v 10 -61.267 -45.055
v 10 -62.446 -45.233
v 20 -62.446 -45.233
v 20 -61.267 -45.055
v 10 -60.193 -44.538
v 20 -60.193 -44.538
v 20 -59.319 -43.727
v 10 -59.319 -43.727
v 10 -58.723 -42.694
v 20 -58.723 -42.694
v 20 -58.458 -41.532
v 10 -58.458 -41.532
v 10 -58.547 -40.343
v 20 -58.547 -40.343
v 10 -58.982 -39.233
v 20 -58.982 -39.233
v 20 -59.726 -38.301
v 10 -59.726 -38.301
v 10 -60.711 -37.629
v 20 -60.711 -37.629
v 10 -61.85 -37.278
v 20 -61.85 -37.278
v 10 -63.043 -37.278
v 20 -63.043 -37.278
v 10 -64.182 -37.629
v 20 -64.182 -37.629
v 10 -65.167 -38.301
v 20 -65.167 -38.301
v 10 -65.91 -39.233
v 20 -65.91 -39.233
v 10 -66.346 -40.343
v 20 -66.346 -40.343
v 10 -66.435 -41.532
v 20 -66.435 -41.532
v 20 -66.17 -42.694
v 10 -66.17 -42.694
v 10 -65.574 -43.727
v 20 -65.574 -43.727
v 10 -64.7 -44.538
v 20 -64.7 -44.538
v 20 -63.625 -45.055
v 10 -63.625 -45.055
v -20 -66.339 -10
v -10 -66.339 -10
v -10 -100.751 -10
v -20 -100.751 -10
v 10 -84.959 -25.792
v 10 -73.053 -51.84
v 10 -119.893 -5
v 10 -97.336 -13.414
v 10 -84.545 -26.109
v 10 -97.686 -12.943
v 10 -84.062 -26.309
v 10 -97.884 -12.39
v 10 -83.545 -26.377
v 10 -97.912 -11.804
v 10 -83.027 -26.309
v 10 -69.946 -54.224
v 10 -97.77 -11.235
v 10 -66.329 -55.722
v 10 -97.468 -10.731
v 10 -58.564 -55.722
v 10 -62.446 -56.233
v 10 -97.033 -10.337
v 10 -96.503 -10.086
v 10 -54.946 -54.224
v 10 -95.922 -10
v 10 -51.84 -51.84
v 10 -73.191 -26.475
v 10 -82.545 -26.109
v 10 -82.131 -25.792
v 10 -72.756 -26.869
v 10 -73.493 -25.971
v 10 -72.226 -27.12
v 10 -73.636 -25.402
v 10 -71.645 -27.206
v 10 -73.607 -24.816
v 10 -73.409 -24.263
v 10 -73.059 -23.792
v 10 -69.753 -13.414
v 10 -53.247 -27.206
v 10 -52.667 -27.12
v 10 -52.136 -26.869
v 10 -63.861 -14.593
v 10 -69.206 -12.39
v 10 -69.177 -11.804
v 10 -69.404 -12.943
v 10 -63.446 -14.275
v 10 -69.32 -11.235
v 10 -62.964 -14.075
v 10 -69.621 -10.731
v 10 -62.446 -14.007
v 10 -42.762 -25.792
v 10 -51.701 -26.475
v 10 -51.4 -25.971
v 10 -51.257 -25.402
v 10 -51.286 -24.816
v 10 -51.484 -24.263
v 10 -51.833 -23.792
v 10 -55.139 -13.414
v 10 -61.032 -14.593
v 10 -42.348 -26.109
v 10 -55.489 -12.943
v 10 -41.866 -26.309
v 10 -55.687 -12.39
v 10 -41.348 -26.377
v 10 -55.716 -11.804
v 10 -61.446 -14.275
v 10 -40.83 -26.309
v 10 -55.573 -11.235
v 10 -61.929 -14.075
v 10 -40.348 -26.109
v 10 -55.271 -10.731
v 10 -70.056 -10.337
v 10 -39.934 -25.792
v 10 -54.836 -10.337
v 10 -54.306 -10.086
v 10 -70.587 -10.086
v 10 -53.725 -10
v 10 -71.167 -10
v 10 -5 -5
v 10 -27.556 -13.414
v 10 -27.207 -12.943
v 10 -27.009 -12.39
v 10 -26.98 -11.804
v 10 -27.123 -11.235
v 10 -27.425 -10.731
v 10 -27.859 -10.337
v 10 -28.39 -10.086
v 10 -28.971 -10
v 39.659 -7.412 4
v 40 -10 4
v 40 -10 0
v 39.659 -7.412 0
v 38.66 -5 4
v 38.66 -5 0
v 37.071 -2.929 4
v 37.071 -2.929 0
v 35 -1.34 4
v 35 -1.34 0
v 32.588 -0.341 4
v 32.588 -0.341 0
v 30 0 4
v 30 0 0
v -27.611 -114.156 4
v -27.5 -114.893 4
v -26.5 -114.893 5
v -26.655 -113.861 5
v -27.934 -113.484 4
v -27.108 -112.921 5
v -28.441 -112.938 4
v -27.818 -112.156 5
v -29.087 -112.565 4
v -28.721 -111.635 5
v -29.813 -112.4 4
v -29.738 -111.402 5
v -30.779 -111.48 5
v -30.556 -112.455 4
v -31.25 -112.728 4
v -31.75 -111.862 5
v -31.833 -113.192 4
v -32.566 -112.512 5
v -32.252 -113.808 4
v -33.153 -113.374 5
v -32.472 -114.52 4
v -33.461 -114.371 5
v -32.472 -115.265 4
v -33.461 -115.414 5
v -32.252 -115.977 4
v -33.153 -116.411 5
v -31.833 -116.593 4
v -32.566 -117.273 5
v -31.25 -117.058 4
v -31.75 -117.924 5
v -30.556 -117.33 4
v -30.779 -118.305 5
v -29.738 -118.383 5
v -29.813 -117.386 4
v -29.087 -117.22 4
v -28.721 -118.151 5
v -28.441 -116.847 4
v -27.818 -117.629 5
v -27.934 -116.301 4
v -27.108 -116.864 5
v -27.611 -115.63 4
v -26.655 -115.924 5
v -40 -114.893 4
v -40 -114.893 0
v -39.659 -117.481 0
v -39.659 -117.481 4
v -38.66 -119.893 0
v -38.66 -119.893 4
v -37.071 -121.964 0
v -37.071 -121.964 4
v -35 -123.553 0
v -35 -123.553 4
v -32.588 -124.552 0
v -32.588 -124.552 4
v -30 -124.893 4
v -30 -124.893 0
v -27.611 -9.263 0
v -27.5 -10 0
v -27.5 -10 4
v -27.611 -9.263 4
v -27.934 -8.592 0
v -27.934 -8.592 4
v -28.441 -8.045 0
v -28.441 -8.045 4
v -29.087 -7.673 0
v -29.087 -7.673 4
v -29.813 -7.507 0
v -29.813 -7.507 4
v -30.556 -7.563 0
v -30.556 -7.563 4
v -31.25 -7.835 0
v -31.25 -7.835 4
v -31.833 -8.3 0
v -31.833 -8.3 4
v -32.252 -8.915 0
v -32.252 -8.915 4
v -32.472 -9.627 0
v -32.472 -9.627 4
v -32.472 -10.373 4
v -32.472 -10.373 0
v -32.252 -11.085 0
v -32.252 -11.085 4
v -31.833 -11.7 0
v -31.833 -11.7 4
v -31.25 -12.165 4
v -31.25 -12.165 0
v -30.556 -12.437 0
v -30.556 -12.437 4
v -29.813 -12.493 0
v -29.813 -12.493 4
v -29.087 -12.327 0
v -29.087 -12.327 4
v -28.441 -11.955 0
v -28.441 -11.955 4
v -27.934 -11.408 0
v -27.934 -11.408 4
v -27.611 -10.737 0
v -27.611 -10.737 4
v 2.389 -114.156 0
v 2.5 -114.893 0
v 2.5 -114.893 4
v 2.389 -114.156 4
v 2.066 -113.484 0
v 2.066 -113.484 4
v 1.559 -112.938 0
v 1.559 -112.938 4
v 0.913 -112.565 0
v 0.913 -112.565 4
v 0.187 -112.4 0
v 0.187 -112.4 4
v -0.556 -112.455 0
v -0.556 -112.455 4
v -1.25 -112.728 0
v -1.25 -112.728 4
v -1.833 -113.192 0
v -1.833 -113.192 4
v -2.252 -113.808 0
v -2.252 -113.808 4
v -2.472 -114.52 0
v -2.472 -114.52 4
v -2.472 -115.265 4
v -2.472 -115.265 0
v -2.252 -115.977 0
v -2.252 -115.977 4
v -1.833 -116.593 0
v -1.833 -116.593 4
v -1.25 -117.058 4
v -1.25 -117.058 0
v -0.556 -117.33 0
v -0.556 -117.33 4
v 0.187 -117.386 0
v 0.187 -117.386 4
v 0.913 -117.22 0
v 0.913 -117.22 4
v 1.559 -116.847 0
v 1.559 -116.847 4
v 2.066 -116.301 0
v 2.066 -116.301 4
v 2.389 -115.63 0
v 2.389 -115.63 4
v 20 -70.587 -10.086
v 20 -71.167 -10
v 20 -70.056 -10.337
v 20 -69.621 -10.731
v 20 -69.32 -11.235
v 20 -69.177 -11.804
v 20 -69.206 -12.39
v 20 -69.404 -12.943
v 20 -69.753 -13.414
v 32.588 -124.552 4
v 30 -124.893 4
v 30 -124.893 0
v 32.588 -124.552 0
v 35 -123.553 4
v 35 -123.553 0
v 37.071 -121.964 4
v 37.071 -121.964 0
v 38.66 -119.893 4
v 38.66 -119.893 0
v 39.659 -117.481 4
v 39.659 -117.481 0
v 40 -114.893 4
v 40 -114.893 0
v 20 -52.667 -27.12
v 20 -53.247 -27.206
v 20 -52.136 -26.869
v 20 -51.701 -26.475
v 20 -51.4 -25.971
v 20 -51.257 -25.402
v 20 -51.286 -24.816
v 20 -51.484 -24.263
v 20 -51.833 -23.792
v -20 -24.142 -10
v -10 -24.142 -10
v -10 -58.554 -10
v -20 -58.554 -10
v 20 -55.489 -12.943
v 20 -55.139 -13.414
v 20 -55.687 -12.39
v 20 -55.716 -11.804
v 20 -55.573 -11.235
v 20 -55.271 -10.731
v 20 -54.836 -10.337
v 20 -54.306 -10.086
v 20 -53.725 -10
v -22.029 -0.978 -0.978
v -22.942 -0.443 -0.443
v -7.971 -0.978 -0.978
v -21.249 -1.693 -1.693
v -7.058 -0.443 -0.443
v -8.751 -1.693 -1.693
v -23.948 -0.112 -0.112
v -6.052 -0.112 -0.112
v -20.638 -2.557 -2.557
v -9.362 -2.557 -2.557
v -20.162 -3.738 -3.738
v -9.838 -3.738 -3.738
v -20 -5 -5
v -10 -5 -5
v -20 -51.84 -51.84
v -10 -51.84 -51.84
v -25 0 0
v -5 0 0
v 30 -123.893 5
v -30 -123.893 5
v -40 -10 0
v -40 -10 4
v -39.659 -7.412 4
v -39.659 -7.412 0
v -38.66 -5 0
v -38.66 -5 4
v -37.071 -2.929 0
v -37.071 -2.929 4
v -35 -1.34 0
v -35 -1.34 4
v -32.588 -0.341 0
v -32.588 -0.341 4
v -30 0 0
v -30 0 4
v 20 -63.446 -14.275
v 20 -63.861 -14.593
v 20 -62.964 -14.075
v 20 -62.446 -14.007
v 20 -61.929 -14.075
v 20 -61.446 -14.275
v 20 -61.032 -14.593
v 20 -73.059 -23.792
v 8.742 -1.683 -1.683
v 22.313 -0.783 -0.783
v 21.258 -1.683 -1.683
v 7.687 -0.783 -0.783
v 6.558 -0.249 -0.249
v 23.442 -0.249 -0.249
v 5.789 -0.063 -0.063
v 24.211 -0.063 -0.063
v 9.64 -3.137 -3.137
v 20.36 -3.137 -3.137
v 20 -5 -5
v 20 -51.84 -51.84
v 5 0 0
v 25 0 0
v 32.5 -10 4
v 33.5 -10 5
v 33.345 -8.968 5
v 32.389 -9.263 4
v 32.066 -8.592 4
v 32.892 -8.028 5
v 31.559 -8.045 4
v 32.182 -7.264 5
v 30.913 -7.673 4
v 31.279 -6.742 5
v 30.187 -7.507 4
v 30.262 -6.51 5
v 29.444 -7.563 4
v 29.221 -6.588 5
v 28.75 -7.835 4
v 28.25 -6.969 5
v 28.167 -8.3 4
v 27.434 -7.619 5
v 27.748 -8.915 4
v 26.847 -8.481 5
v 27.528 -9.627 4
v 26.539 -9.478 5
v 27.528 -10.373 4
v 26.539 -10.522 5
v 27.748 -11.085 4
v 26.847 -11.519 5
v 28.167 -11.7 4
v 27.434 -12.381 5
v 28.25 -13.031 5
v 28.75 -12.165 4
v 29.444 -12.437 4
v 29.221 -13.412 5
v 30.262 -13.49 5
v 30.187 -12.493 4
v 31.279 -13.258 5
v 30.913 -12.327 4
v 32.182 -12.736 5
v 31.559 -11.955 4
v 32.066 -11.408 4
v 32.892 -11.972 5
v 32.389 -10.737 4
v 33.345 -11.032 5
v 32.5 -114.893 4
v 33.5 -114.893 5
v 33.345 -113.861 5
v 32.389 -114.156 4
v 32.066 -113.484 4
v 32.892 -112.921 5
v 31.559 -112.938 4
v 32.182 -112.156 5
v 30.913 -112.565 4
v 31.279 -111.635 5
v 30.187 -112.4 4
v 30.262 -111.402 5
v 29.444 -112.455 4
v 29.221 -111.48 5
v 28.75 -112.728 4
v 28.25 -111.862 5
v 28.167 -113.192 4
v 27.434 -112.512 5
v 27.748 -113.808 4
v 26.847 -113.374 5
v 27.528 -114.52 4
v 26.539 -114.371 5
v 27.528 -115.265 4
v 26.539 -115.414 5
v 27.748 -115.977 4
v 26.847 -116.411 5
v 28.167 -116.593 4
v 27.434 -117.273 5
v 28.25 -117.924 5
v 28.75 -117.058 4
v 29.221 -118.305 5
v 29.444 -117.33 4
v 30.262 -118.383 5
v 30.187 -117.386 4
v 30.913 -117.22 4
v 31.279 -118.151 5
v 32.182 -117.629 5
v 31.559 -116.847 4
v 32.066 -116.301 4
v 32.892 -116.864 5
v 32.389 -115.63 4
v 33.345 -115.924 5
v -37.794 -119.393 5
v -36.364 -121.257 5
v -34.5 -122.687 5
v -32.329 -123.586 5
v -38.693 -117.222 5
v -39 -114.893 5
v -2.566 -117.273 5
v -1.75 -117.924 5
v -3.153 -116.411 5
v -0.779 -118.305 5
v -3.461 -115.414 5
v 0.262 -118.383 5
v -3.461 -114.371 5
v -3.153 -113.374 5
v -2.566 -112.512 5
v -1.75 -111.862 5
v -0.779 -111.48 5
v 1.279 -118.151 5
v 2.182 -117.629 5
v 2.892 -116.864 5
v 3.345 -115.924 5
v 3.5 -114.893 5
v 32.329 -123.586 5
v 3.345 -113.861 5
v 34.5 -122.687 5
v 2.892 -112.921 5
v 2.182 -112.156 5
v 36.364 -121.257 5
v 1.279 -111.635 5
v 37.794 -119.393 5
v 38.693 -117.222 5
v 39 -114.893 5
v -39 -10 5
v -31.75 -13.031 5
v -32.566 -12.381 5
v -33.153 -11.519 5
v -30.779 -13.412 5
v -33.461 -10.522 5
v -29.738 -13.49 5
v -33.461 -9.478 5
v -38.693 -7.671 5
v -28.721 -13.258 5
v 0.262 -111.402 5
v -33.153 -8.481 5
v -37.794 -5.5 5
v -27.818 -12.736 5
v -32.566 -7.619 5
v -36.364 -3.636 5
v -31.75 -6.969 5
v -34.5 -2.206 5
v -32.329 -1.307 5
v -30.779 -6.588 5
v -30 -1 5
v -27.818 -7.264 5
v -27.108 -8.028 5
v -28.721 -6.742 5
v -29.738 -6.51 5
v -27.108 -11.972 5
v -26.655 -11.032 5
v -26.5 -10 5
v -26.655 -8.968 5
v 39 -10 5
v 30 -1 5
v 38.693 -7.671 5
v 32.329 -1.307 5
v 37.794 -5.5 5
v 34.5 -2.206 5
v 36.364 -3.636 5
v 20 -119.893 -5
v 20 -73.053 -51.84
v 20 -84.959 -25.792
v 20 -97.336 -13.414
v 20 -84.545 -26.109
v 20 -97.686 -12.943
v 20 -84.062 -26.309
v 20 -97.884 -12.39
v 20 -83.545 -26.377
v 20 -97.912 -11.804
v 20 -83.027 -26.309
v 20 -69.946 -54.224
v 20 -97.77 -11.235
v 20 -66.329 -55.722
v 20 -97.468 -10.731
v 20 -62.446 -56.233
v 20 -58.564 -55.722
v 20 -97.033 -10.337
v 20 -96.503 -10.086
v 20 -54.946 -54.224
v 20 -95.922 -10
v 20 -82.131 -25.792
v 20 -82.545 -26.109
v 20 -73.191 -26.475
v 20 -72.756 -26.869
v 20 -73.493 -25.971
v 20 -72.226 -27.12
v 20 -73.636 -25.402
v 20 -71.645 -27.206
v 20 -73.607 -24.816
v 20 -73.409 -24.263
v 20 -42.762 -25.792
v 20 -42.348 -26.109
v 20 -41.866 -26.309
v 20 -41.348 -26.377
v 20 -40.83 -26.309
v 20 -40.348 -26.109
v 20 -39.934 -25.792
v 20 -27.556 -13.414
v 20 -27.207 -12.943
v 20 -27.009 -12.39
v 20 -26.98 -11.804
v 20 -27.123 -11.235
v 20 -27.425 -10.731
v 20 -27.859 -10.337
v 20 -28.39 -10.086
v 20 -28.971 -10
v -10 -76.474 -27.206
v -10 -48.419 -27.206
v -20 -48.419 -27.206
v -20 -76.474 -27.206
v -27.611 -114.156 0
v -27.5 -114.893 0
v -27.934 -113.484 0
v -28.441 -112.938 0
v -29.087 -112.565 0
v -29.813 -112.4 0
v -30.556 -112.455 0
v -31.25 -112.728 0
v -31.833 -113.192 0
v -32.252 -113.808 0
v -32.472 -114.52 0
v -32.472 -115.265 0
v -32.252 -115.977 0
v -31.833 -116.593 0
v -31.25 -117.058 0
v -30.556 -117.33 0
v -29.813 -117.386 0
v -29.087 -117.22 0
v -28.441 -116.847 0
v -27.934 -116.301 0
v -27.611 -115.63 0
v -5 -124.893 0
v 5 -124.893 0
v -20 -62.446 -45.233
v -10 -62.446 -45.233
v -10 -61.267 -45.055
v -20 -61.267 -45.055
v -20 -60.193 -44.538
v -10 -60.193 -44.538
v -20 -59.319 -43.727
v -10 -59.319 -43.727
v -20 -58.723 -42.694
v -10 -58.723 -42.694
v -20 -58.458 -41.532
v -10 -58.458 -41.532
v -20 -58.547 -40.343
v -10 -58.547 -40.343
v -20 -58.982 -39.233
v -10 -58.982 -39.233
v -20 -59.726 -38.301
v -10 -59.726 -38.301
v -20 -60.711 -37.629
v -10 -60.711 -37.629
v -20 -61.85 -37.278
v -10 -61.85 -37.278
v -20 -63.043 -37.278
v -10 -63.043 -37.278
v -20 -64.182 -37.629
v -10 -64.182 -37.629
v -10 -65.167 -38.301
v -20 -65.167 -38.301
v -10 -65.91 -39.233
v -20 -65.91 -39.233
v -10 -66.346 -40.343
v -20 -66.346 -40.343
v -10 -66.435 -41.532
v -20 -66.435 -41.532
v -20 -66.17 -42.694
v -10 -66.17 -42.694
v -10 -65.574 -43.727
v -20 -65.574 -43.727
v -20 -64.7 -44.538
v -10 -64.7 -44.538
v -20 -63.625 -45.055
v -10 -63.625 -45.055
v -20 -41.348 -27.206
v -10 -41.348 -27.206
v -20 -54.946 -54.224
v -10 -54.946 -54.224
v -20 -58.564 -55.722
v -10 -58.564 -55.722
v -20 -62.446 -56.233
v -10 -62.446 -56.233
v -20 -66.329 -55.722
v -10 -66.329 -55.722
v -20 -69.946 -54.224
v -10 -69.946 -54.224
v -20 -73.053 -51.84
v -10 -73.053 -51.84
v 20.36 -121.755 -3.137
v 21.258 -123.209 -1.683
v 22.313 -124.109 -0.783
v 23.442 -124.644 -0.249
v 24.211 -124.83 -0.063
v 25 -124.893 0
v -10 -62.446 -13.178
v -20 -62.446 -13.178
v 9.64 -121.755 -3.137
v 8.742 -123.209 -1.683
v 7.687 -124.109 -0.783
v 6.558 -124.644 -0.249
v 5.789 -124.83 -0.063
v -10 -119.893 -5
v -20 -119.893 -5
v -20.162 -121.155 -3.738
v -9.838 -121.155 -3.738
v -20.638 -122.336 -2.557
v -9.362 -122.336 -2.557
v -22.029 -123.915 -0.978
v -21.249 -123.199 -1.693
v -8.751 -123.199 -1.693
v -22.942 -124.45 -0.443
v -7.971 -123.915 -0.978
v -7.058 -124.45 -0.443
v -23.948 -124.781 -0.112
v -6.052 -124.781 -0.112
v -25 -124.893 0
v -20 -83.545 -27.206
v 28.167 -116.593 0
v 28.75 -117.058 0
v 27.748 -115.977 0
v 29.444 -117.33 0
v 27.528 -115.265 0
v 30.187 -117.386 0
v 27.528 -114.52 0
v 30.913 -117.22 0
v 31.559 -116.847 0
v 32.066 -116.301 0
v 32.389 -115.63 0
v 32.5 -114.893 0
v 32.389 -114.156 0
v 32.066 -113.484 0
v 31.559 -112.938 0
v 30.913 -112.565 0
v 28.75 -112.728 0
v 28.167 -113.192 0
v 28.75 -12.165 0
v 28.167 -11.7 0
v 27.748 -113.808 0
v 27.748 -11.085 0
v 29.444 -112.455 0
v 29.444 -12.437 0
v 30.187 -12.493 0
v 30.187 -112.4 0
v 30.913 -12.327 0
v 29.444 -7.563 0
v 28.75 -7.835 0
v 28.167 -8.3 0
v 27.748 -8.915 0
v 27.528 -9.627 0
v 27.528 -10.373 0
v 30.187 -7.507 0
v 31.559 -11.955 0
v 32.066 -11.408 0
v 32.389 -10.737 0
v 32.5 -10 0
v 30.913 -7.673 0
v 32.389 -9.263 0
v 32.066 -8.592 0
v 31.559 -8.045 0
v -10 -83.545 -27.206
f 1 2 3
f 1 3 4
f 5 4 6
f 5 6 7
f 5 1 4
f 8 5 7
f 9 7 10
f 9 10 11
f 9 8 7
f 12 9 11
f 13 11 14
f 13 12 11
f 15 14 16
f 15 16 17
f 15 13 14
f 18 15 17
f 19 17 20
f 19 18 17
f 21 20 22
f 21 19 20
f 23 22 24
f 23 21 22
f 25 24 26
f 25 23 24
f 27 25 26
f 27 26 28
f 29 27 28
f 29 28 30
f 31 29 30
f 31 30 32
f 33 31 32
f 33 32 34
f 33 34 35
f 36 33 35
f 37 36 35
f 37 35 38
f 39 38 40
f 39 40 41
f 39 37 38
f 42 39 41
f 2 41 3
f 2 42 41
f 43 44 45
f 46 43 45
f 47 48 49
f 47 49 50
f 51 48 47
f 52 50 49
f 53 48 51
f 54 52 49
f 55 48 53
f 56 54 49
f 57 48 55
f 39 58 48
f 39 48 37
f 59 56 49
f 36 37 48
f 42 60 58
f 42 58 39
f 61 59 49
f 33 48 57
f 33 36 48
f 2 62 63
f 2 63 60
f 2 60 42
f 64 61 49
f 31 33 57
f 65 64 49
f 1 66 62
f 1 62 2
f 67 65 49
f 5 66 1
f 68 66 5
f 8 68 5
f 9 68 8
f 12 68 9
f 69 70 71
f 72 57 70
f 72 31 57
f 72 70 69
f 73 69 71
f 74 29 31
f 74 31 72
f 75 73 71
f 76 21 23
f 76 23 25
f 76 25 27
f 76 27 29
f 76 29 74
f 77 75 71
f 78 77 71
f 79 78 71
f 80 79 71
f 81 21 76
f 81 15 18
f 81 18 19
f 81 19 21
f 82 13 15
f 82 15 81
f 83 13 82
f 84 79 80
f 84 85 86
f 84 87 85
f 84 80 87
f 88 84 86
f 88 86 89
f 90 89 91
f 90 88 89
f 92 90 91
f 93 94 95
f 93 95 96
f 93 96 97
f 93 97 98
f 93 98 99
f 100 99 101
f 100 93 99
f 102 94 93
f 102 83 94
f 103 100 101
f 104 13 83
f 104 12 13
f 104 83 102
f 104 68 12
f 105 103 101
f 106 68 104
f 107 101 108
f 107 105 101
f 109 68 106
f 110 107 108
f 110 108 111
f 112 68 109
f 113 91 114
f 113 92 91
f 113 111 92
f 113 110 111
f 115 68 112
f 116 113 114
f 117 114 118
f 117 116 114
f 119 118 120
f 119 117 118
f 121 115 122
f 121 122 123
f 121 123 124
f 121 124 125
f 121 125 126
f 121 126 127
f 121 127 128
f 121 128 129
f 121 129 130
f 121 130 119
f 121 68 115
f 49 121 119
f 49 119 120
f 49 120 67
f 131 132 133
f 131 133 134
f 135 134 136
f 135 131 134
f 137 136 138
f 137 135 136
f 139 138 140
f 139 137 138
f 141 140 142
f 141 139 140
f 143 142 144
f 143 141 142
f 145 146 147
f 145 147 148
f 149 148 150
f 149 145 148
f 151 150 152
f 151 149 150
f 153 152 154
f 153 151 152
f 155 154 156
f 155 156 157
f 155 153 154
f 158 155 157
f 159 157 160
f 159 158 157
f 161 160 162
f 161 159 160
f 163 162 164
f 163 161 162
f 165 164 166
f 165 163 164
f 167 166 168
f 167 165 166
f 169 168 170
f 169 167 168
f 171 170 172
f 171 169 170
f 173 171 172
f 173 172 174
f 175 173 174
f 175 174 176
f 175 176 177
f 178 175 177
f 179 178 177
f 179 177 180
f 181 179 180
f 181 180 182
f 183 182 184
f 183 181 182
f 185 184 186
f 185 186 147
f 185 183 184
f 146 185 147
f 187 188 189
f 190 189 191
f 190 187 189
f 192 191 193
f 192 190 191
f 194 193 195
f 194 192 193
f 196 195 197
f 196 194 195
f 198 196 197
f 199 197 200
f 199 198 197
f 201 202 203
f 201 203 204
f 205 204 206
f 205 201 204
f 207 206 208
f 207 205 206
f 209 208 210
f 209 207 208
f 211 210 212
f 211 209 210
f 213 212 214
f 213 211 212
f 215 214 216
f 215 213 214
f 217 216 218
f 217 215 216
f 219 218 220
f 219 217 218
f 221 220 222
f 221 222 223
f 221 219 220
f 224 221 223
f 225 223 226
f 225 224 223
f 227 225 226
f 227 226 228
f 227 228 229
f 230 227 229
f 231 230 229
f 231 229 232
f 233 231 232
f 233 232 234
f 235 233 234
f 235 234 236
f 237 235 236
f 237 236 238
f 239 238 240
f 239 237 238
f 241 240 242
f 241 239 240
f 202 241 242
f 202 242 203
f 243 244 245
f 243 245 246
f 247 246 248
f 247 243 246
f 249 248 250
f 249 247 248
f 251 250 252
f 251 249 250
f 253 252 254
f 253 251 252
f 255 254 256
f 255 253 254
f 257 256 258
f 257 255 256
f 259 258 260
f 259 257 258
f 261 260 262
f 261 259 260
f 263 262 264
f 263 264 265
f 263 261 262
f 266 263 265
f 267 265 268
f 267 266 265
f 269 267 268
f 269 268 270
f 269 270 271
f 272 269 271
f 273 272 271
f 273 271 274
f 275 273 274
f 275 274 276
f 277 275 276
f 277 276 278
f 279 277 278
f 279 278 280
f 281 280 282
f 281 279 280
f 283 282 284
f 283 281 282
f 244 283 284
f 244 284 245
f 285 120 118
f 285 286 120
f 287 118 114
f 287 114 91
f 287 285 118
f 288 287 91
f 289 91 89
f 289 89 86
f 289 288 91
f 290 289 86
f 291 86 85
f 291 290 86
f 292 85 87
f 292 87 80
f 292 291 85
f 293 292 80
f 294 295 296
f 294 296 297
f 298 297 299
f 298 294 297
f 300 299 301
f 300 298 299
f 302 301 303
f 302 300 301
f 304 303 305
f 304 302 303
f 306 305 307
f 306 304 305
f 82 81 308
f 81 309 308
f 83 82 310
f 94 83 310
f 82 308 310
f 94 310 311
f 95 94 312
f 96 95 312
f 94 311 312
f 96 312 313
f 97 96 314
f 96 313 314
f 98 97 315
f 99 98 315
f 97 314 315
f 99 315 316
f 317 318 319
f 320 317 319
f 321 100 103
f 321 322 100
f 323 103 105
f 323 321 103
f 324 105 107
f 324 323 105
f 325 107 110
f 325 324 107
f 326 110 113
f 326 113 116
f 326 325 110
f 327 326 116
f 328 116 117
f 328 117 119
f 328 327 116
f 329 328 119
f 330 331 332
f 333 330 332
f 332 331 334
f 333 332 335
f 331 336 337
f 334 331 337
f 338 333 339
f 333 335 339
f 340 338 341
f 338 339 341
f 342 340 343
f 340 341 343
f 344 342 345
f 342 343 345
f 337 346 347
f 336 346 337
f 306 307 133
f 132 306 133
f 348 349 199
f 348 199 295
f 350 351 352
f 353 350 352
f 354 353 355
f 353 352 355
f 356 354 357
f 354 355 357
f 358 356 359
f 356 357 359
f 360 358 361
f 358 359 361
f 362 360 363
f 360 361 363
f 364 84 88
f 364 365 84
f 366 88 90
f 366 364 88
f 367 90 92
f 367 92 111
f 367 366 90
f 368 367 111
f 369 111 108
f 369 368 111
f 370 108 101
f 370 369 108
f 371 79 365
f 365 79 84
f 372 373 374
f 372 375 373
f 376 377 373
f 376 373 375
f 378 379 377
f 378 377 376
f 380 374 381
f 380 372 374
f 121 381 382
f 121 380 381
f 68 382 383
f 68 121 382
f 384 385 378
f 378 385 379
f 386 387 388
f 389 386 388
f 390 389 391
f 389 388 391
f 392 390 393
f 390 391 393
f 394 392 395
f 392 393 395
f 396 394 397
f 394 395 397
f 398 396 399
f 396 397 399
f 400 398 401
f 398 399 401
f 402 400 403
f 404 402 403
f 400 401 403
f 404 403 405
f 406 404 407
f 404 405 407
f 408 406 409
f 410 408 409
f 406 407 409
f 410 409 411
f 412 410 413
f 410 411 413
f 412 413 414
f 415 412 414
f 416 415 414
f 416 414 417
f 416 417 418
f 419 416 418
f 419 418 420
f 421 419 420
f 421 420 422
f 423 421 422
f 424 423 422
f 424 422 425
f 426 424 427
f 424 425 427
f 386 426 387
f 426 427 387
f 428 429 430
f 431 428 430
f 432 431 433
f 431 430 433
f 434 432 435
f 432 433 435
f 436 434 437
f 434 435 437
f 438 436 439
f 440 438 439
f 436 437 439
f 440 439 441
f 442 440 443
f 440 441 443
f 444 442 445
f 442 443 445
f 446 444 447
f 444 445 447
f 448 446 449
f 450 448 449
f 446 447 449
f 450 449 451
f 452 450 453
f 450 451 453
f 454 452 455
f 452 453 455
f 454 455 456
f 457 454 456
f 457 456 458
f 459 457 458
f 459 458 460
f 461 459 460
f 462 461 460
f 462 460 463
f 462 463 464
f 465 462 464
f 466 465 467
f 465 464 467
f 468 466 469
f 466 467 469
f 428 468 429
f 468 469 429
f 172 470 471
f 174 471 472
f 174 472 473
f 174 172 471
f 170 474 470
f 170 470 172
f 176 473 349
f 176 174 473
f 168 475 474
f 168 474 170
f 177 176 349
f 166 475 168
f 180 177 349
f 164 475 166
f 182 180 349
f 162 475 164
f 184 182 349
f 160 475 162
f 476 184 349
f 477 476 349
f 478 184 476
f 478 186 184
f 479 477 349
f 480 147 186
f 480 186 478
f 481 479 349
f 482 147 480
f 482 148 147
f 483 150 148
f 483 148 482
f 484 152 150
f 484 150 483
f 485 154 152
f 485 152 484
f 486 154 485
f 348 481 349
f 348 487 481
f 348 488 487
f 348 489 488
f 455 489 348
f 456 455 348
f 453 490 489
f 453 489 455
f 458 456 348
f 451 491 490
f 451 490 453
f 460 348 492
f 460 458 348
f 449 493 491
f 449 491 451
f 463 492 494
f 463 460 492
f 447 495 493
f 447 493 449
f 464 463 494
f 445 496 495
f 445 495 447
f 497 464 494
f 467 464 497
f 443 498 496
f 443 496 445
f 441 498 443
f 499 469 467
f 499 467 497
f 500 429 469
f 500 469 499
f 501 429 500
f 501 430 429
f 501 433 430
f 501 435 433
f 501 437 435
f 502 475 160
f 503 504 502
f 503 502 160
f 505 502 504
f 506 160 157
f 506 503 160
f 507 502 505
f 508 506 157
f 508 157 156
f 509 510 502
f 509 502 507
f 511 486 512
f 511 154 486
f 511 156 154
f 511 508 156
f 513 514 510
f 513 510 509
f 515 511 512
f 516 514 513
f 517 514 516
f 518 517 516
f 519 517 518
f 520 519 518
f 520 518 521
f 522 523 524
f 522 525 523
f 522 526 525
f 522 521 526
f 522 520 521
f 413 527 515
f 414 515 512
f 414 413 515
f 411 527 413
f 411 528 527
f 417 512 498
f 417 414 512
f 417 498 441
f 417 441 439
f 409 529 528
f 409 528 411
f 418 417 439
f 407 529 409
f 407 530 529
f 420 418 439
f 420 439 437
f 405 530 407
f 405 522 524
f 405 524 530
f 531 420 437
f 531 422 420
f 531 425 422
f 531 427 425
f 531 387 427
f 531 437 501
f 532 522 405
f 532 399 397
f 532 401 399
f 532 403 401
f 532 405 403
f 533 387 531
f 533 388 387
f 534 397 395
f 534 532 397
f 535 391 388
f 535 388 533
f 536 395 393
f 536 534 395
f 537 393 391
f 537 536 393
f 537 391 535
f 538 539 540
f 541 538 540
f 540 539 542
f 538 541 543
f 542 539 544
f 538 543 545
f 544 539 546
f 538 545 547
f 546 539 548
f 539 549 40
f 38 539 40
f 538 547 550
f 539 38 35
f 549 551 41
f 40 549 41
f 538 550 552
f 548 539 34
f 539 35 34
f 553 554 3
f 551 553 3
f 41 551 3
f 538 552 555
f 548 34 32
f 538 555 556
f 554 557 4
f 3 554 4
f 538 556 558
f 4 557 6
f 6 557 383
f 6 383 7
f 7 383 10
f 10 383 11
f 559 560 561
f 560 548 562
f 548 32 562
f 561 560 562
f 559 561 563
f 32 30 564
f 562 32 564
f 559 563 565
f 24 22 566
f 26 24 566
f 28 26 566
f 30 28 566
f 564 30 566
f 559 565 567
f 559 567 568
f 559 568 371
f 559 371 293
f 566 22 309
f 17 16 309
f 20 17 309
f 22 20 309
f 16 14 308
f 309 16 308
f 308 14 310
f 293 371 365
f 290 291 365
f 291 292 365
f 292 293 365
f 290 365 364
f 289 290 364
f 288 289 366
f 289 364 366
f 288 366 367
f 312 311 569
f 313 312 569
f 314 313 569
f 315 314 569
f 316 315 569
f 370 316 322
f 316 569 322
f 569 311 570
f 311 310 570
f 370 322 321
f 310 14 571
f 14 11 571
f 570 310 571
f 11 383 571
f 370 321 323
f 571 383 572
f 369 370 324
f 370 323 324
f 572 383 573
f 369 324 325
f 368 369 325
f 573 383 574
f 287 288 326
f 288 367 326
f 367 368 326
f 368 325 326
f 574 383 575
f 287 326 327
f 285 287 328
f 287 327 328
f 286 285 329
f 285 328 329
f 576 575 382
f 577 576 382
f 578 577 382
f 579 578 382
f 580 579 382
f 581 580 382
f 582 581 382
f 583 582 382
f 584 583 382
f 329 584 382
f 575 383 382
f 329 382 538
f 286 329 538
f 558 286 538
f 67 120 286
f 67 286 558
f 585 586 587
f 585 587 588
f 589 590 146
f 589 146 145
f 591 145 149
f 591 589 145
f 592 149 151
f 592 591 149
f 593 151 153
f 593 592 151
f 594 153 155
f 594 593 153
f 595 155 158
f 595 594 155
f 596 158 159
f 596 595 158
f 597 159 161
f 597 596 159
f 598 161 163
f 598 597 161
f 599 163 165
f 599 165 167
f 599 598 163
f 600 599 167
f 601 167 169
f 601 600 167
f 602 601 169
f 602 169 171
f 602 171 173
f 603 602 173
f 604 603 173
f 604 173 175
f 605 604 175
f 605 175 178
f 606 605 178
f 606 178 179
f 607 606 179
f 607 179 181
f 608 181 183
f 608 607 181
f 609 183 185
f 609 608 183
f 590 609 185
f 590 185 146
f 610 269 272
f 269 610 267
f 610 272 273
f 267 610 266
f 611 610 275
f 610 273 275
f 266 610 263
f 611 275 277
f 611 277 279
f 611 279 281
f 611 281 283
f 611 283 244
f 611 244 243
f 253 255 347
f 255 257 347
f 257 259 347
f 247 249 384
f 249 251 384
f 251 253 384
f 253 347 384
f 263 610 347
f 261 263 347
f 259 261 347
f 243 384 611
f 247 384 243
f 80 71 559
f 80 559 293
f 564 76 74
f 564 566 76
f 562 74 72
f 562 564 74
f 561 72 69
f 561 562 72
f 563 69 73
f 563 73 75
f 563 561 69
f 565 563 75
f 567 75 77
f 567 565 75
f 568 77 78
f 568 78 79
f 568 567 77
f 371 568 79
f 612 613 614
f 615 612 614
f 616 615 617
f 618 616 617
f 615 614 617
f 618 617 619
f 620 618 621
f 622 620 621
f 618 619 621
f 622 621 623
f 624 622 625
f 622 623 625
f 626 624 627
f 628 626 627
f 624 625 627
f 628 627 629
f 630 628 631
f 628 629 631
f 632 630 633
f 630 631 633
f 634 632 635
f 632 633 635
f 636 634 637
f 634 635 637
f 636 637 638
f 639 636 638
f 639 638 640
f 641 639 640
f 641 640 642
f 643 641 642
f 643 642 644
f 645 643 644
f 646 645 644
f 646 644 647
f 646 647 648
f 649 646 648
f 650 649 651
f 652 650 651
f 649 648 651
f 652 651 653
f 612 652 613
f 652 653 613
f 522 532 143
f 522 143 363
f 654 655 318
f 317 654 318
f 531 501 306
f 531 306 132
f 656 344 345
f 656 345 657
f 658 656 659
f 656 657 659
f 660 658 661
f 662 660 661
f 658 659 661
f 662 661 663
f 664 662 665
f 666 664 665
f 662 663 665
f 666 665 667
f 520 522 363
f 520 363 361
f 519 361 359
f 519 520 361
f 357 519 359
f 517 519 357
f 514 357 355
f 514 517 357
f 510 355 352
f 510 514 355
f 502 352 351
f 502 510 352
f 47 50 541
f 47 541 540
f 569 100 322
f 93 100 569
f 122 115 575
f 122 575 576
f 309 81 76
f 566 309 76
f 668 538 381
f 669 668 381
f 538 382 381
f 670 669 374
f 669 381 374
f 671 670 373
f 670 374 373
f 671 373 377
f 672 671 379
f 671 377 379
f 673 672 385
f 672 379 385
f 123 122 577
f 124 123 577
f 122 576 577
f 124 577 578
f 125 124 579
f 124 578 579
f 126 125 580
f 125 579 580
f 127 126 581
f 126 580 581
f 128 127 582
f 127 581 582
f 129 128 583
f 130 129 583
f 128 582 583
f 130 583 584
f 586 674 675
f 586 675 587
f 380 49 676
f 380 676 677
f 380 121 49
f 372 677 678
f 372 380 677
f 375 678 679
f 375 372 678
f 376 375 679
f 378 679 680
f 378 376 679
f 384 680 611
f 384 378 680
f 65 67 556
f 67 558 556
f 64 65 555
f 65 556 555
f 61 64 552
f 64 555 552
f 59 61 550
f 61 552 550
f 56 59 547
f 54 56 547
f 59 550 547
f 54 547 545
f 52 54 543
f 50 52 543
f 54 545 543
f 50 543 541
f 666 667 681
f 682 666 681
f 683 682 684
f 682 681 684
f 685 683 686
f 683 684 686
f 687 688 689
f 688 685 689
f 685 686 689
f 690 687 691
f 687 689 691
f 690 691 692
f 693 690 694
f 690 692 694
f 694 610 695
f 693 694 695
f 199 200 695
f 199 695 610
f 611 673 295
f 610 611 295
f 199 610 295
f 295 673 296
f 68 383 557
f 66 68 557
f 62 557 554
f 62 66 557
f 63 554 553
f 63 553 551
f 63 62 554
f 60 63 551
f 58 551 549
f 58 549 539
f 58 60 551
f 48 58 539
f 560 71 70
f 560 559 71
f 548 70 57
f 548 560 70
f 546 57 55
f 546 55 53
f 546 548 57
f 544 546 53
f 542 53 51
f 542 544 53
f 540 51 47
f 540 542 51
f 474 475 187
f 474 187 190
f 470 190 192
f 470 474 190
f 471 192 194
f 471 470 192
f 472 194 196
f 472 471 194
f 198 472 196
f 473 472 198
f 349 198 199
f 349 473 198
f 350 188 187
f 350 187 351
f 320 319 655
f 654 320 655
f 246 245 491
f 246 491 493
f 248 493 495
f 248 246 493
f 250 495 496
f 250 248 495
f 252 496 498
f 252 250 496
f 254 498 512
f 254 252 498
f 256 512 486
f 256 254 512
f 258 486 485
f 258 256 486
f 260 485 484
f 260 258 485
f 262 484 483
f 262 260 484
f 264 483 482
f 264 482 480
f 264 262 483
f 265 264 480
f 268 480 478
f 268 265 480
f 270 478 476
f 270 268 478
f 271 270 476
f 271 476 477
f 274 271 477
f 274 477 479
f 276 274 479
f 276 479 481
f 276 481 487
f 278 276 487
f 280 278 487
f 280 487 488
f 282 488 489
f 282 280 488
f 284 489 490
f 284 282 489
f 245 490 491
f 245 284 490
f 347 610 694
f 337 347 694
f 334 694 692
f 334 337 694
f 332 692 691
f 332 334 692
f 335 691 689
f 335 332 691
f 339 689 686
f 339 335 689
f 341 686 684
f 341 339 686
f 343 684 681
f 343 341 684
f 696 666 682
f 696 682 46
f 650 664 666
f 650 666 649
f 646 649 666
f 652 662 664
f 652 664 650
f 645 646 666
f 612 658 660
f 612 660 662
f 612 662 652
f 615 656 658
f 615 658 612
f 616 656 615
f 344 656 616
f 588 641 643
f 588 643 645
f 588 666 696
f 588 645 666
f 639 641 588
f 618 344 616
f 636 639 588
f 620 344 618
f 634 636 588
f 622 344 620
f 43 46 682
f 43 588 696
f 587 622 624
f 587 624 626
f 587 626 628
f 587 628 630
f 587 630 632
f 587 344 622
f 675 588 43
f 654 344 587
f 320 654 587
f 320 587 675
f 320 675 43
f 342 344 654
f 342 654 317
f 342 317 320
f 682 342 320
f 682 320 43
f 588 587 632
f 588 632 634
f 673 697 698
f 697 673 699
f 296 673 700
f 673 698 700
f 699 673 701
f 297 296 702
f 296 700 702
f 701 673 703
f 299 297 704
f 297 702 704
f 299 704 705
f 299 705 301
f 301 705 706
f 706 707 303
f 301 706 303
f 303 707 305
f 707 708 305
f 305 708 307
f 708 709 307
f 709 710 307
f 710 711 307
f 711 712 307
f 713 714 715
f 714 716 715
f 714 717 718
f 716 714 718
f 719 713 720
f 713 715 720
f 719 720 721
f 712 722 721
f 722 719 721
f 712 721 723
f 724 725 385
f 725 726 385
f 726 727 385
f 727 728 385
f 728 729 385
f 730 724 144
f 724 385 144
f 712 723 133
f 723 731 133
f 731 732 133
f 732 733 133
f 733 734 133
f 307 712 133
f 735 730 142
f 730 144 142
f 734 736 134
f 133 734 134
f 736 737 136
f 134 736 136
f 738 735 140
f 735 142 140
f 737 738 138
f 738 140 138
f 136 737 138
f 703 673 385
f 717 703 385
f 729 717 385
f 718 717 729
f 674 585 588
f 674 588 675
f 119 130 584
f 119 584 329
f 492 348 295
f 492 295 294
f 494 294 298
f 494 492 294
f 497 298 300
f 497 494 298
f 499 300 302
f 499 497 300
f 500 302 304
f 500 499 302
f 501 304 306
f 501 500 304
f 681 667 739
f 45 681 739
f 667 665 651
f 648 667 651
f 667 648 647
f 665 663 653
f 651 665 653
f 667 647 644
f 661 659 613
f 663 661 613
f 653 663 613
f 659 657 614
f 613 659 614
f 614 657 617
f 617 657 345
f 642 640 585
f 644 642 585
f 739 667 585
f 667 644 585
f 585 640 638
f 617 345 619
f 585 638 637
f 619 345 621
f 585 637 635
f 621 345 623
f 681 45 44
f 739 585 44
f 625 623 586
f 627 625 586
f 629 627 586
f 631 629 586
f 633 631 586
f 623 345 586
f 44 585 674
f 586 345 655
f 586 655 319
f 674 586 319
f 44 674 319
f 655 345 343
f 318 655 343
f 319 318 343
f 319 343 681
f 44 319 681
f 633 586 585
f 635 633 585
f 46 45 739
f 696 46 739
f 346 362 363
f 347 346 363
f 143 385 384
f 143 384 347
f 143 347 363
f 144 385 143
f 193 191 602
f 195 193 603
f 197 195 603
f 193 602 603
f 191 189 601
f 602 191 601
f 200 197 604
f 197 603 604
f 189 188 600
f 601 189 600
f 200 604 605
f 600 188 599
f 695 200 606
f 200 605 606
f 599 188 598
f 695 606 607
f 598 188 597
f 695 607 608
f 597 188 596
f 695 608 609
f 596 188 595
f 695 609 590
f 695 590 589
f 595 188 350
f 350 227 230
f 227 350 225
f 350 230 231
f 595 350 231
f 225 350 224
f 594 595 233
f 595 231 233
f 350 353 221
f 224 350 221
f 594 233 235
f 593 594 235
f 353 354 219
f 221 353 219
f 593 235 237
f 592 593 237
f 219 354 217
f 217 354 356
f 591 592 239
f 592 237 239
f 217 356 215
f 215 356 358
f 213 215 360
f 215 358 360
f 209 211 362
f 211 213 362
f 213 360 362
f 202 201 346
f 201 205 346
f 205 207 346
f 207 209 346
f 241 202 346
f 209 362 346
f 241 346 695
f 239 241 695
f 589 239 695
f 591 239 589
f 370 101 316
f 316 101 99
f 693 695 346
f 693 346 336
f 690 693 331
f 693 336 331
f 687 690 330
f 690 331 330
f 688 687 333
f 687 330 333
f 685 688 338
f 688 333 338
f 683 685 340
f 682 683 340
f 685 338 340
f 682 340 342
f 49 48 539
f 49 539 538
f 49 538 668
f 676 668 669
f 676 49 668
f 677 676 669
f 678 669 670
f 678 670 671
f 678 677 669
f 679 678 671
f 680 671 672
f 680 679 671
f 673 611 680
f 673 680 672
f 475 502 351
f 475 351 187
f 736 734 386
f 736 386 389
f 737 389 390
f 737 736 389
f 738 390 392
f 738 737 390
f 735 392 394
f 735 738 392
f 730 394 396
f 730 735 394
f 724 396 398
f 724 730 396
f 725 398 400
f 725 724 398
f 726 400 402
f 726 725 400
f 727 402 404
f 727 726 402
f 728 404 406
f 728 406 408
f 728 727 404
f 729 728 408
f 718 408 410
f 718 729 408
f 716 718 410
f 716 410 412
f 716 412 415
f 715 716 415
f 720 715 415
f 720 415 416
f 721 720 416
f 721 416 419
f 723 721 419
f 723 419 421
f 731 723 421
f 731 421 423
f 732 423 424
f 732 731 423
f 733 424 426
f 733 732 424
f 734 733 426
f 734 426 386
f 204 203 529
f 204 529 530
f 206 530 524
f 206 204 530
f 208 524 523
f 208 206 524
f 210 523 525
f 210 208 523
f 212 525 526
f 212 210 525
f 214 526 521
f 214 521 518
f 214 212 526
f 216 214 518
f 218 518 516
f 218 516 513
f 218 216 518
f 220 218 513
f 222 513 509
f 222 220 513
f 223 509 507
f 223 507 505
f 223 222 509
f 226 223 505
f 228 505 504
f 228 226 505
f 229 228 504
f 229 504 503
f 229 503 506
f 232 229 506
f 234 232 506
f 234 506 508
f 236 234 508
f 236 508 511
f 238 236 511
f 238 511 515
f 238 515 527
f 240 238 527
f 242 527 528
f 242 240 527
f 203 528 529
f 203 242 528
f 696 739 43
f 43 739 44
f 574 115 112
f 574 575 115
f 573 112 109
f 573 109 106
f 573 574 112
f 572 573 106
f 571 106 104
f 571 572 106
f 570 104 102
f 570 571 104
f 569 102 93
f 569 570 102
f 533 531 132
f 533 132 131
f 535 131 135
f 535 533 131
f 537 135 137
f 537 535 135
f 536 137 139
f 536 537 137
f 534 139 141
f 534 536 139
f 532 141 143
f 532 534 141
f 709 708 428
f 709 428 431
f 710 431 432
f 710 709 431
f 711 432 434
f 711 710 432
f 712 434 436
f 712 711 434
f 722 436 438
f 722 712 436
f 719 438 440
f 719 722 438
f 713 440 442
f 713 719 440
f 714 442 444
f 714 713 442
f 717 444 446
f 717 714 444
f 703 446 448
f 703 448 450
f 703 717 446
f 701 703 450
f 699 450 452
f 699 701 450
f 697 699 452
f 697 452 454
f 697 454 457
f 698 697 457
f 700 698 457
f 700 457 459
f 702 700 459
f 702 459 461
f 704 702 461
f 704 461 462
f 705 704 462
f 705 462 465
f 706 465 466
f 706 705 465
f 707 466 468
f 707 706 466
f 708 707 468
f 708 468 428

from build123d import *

# Parameters (mm, degrees)
ESBO_O1_R                = 4
RESSALTO_EXTRUS_O2_DEPTH = 10
ESBO_O2_W                = 80
ESBO_O2_H                = 124.892668507
ESBO_O2_R                = 2.5
RESSALTO_EXTRUS_O3_DEPTH = 5
FILETE5_R                = 2
FILETE6_R                = 5
FILETE7_R                = 10
CHANFRO1_SIZE            = 1


with BuildPart() as part:
    # Esboço1 → Ressalto-extrusão2 (new body)
    with BuildSketch(Plane(origin=(10, 0, 0), x_dir=(0, 0, -1), z_dir=(1, 0, 0))):
        with BuildLine():
            Line((51.839732536, -73.052935971), (0, -124.892668507))
            Line((0, -124.892668507), (0, 0))
            Line((0, 0), (51.839732536, -51.839732536))
            ThreePointArc((51.839732536, -51.839732536), (56.233130818, -62.446334254), (51.839732536, -73.052935971))
        make_face()
        with Locations((41.233130818, -62.446334254)):
            Circle(ESBO_O1_R, mode=Mode.SUBTRACT)
        Polygon((10, -24.142135624), (10, -58.553710058), (27.205787217, -41.347922841), align=None, mode=Mode.SUBTRACT)
        Polygon((10, -100.750532883), (27.205787217, -83.544745666), (10, -66.338958449), align=None, mode=Mode.SUBTRACT)
        Polygon((27.205787217, -48.418990653), (27.205787217, -76.473677854), (13.178443616, -62.446334254), align=None, mode=Mode.SUBTRACT)
    extrude(amount=RESSALTO_EXTRUS_O2_DEPTH)


with BuildPart() as body_2:
    # Espelhar2: mirrored copy
    add(part.part.mirror(Plane(origin=(0, 0, 0), x_dir=(0, 0, 1), z_dir=(1, 0, 0))))


with BuildPart() as part_1:
    add(part.part)

    add(body_2.part)  # Ressalto-extrusão3 merges body 2
    # Esboço2 → Ressalto-extrusão3 (add)
    with BuildSketch(Plane.XY):
        with Locations((0, -62.446334254)):
            Rectangle(ESBO_O2_W, ESBO_O2_H)
        with Locations((-30, -10)):
            Circle(ESBO_O2_R, mode=Mode.SUBTRACT)
        with Locations((30, -10)):
            Circle(ESBO_O2_R, mode=Mode.SUBTRACT)
        with Locations((-30, -114.892668507)):
            Circle(ESBO_O2_R, mode=Mode.SUBTRACT)
        with Locations((30, -114.892668507)):
            Circle(ESBO_O2_R, mode=Mode.SUBTRACT)
        with Locations((0, -114.892668507)):
            Circle(ESBO_O2_R, mode=Mode.SUBTRACT)
    extrude(amount=RESSALTO_EXTRUS_O3_DEPTH)

    # Filete5
    filete5_edges = [part_1.edges().sort_by_distance(p)[0] for p in [
        (15, -100.750532883, -10),
        (15, -83.544745666, -27.205787217),
        (15, -66.338958449, -10),
        (15, -24.142135624, -10),
        (15, -58.553710058, -10),
        (15, -41.347922841, -27.205787217),
        (15, -76.473677854, -27.205787217),
        (15, -48.418990653, -27.205787217),
        (15, -62.446334254, -13.178443616),
    ]]
    fillet(filete5_edges, radius=FILETE5_R)

    # Filete6
    filete6_edges = [part_1.edges().sort_by_distance(p)[0] for p in [
        (10, -62.446334254, 0),
        (20, -62.446334254, 0),
        (-10, -62.446334254, 0),
        (-20, -62.446334254, 0),
    ]]
    fillet(filete6_edges, radius=FILETE6_R)

    # Filete7
    filete7_edges = [part_1.edges().sort_by_distance(p)[0] for p in [
        (-40, 0, 2.5),
        (-40, -124.892668507, 2.5),
        (40, -124.892668507, 2.5),
        (40, 0, 2.5),
    ]]
    fillet(filete7_edges, radius=FILETE7_R)

    # Chanfro1
    chanfro1_edges = [part_1.edges().sort_by_distance(p)[0] for p in [
        (0, -124.892668507, 5),
        (-40, -62.446334254, 5),
        (40, -62.446334254, 5),
        (0, 0, 5),
        (37.071067812, -2.928932188, 5),
        (-37.071067812, -2.928932188, 5),
        (37.071067812, -121.963736319, 5),
        (-37.071067812, -121.963736319, 5),
        (-32.5, -10, 5),
        (27.5, -10, 5),
        (-32.5, -114.892668507, 5),
        (27.5, -114.892668507, 5),
        (-2.5, -114.892668507, 5),
    ]]
    chamfer(chanfro1_edges, length=CHANFRO1_SIZE)


solid = part_1.part
